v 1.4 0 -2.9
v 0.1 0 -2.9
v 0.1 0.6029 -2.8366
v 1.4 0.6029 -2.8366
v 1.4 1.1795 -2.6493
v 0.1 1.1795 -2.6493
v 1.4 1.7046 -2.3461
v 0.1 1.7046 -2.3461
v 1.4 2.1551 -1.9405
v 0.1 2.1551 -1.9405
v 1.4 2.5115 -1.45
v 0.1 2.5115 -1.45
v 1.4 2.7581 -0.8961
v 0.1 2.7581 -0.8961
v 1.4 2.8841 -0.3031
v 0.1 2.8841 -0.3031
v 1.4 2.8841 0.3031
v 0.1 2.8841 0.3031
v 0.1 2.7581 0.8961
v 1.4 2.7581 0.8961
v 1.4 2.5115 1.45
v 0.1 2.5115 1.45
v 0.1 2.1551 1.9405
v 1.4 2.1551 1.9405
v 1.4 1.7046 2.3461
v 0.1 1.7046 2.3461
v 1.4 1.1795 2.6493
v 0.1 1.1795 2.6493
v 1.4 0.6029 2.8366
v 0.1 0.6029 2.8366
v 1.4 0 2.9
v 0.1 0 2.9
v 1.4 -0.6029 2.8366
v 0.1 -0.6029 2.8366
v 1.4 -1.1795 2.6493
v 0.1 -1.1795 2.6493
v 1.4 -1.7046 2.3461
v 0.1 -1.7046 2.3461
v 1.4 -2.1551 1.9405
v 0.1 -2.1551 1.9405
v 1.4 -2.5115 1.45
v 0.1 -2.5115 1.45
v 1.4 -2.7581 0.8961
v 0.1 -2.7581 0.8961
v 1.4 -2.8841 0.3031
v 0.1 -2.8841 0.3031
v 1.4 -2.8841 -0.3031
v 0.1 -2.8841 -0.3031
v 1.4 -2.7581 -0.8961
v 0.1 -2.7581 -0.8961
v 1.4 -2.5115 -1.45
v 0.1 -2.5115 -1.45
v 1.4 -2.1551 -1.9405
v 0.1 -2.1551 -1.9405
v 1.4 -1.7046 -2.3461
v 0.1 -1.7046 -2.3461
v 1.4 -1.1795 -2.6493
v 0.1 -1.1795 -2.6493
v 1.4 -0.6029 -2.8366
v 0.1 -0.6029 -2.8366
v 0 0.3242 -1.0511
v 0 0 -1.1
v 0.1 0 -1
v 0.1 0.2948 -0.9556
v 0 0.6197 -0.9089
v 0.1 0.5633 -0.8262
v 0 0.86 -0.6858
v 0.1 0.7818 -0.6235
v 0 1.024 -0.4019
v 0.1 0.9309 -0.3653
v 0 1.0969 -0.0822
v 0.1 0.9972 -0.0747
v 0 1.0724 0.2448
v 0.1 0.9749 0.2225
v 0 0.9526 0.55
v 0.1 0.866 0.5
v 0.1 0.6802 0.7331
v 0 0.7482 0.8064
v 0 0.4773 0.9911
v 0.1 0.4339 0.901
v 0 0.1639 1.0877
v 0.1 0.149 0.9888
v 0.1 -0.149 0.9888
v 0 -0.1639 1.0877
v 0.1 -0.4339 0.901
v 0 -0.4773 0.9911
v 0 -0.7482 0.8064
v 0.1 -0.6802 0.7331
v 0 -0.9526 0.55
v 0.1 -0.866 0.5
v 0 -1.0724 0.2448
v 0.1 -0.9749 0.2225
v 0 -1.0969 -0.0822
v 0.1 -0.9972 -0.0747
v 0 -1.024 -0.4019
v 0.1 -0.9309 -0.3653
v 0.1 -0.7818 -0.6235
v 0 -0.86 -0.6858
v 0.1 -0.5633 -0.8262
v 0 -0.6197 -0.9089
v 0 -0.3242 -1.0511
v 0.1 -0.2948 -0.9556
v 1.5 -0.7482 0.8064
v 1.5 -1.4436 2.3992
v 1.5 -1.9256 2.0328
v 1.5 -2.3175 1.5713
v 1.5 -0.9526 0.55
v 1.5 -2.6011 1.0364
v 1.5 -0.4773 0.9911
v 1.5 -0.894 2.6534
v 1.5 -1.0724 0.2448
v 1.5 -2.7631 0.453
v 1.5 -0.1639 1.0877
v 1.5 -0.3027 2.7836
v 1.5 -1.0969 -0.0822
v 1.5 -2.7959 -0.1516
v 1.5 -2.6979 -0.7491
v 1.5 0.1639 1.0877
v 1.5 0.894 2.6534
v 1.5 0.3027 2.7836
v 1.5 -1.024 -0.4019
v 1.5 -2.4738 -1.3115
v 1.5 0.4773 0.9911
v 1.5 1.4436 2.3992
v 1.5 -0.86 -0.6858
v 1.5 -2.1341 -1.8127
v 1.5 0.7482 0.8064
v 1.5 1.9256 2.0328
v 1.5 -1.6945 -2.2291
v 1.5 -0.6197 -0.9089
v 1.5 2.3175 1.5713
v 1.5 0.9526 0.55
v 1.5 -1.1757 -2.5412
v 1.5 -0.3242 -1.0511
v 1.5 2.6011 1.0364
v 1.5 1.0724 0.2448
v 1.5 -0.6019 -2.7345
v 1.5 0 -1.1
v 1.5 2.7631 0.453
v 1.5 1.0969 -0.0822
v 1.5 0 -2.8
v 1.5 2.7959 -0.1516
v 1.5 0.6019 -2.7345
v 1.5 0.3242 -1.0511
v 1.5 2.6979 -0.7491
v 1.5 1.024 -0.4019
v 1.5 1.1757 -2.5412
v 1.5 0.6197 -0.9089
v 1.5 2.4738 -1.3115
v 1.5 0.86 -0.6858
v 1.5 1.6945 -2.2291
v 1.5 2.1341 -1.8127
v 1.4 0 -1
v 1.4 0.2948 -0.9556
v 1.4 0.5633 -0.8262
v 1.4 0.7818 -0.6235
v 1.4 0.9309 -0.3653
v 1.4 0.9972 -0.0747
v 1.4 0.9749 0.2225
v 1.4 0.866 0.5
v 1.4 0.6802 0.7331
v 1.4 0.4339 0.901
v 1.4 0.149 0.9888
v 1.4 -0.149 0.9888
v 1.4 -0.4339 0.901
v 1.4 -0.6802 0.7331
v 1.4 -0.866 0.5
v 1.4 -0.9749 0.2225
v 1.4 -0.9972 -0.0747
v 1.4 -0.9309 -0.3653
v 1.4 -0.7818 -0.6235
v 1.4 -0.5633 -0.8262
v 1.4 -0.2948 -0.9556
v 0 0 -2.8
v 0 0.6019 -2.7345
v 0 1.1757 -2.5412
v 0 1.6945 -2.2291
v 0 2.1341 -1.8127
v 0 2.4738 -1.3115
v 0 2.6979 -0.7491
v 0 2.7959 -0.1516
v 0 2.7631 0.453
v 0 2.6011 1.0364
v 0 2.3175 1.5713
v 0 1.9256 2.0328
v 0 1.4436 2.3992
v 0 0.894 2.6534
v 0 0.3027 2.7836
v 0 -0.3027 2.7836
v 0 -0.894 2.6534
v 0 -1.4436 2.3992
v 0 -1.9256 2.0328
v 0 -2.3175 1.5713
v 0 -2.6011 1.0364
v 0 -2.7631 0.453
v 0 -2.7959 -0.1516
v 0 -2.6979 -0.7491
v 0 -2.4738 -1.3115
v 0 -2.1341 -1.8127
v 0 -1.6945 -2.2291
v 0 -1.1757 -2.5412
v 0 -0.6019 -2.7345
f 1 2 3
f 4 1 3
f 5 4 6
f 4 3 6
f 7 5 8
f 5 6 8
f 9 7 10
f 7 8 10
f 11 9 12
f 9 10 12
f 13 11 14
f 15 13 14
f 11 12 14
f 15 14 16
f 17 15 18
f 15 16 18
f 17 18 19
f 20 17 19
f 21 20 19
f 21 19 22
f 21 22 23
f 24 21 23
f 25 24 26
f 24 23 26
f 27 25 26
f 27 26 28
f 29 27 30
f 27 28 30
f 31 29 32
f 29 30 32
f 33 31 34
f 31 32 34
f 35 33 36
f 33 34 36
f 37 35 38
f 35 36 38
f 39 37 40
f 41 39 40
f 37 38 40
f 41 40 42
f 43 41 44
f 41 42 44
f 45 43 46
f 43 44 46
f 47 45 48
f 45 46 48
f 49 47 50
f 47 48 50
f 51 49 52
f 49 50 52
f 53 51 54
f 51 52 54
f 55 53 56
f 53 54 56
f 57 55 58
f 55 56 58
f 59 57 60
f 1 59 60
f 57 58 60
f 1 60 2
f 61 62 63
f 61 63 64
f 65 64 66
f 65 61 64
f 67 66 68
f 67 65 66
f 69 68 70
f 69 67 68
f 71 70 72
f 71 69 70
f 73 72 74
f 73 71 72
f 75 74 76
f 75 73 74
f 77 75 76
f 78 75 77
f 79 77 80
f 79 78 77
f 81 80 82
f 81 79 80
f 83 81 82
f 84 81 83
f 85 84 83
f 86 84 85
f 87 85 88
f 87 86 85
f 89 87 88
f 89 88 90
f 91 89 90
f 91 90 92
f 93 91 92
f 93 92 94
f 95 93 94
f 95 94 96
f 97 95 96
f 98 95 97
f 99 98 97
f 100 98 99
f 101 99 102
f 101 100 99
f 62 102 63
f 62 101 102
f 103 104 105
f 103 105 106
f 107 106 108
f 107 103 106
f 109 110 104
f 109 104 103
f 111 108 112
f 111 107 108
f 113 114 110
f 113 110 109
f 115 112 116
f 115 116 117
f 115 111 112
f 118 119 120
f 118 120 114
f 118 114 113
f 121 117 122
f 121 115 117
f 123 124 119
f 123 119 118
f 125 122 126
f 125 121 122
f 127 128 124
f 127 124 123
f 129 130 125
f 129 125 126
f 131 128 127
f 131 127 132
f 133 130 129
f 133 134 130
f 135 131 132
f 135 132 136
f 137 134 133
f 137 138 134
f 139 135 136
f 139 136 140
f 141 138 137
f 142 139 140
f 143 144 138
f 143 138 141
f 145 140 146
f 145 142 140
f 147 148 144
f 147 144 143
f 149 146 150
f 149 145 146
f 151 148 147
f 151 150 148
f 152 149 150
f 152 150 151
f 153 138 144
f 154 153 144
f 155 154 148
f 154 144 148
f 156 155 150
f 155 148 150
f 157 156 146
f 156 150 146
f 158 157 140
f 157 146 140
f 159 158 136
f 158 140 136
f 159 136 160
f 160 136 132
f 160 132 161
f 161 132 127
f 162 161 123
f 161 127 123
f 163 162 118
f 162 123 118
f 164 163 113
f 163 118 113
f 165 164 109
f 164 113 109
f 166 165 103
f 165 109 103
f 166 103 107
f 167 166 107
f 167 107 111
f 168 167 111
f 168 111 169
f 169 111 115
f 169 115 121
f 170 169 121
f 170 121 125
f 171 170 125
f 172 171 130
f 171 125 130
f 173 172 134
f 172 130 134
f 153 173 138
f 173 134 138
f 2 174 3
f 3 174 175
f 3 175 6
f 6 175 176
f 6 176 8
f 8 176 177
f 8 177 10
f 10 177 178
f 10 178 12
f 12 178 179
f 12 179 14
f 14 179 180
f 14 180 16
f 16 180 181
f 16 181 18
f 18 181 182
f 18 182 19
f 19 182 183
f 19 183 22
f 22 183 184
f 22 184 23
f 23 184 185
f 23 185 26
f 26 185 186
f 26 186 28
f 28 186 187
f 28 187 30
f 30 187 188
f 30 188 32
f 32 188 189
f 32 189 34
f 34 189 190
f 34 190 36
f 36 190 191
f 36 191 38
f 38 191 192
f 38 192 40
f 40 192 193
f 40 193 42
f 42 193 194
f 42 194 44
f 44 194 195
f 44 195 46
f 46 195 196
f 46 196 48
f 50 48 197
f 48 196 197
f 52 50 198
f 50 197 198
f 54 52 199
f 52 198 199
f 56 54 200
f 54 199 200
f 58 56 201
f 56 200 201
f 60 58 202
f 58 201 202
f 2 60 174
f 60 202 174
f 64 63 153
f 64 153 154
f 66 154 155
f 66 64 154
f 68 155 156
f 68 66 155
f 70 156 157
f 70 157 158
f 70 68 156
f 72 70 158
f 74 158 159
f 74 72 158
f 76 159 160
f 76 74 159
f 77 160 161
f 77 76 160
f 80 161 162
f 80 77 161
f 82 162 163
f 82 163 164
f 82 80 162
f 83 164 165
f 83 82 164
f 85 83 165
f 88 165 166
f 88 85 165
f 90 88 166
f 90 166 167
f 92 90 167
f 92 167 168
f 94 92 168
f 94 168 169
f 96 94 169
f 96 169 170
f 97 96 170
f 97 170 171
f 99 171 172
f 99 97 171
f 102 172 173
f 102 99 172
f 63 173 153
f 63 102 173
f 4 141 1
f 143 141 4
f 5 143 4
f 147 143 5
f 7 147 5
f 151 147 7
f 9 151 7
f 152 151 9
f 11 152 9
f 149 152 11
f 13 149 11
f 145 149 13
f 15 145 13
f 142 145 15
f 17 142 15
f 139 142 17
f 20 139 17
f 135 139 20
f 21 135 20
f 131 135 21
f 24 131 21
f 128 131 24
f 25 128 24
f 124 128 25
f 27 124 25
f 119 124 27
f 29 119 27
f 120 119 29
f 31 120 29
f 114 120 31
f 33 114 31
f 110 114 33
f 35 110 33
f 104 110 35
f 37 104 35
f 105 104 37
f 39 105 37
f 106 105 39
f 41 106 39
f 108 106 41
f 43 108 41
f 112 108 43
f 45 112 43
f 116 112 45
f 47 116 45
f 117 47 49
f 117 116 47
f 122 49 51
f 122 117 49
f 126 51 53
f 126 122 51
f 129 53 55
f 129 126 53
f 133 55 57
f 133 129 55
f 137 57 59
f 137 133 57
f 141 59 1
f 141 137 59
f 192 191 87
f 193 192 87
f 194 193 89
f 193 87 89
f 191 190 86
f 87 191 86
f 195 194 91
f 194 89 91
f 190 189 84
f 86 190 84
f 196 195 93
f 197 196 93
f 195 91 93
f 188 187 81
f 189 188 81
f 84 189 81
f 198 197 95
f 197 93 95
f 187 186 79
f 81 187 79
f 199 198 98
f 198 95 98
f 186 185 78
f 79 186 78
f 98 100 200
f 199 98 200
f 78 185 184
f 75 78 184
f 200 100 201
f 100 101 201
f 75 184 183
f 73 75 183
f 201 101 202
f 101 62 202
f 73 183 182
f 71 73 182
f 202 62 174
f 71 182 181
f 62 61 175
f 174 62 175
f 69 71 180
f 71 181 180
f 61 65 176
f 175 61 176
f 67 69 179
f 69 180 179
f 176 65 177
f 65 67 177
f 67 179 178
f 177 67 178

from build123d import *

# Parameters (mm, degrees)
CROQUIS1_R              = 2.9
CROQUIS1_R_2            = 1
SALIENTE_EXTRUIR1_DEPTH = 1.5
CHAFL_N1_SIZE           = 0.1


with BuildPart() as part:
    # Croquis1 → Saliente-Extruir1 (new body)
    with BuildSketch(Plane(origin=(0, 0, 0), x_dir=(0, 0, -1), z_dir=(1, 0, 0))):
        Circle(CROQUIS1_R)
        Circle(CROQUIS1_R_2, mode=Mode.SUBTRACT)
    extrude(amount=SALIENTE_EXTRUIR1_DEPTH)

    # Chaflán1
    chafl_n1_edges = [part.edges().sort_by_distance(p)[0] for p in [
        (0, 0, 2.9),
        (1.5, 0, 2.9),
        (0, 0, 1),
        (1.5, 0, 1),
    ]]
    chamfer(chafl_n1_edges, length=CHAFL_N1_SIZE)


solid = part.part
